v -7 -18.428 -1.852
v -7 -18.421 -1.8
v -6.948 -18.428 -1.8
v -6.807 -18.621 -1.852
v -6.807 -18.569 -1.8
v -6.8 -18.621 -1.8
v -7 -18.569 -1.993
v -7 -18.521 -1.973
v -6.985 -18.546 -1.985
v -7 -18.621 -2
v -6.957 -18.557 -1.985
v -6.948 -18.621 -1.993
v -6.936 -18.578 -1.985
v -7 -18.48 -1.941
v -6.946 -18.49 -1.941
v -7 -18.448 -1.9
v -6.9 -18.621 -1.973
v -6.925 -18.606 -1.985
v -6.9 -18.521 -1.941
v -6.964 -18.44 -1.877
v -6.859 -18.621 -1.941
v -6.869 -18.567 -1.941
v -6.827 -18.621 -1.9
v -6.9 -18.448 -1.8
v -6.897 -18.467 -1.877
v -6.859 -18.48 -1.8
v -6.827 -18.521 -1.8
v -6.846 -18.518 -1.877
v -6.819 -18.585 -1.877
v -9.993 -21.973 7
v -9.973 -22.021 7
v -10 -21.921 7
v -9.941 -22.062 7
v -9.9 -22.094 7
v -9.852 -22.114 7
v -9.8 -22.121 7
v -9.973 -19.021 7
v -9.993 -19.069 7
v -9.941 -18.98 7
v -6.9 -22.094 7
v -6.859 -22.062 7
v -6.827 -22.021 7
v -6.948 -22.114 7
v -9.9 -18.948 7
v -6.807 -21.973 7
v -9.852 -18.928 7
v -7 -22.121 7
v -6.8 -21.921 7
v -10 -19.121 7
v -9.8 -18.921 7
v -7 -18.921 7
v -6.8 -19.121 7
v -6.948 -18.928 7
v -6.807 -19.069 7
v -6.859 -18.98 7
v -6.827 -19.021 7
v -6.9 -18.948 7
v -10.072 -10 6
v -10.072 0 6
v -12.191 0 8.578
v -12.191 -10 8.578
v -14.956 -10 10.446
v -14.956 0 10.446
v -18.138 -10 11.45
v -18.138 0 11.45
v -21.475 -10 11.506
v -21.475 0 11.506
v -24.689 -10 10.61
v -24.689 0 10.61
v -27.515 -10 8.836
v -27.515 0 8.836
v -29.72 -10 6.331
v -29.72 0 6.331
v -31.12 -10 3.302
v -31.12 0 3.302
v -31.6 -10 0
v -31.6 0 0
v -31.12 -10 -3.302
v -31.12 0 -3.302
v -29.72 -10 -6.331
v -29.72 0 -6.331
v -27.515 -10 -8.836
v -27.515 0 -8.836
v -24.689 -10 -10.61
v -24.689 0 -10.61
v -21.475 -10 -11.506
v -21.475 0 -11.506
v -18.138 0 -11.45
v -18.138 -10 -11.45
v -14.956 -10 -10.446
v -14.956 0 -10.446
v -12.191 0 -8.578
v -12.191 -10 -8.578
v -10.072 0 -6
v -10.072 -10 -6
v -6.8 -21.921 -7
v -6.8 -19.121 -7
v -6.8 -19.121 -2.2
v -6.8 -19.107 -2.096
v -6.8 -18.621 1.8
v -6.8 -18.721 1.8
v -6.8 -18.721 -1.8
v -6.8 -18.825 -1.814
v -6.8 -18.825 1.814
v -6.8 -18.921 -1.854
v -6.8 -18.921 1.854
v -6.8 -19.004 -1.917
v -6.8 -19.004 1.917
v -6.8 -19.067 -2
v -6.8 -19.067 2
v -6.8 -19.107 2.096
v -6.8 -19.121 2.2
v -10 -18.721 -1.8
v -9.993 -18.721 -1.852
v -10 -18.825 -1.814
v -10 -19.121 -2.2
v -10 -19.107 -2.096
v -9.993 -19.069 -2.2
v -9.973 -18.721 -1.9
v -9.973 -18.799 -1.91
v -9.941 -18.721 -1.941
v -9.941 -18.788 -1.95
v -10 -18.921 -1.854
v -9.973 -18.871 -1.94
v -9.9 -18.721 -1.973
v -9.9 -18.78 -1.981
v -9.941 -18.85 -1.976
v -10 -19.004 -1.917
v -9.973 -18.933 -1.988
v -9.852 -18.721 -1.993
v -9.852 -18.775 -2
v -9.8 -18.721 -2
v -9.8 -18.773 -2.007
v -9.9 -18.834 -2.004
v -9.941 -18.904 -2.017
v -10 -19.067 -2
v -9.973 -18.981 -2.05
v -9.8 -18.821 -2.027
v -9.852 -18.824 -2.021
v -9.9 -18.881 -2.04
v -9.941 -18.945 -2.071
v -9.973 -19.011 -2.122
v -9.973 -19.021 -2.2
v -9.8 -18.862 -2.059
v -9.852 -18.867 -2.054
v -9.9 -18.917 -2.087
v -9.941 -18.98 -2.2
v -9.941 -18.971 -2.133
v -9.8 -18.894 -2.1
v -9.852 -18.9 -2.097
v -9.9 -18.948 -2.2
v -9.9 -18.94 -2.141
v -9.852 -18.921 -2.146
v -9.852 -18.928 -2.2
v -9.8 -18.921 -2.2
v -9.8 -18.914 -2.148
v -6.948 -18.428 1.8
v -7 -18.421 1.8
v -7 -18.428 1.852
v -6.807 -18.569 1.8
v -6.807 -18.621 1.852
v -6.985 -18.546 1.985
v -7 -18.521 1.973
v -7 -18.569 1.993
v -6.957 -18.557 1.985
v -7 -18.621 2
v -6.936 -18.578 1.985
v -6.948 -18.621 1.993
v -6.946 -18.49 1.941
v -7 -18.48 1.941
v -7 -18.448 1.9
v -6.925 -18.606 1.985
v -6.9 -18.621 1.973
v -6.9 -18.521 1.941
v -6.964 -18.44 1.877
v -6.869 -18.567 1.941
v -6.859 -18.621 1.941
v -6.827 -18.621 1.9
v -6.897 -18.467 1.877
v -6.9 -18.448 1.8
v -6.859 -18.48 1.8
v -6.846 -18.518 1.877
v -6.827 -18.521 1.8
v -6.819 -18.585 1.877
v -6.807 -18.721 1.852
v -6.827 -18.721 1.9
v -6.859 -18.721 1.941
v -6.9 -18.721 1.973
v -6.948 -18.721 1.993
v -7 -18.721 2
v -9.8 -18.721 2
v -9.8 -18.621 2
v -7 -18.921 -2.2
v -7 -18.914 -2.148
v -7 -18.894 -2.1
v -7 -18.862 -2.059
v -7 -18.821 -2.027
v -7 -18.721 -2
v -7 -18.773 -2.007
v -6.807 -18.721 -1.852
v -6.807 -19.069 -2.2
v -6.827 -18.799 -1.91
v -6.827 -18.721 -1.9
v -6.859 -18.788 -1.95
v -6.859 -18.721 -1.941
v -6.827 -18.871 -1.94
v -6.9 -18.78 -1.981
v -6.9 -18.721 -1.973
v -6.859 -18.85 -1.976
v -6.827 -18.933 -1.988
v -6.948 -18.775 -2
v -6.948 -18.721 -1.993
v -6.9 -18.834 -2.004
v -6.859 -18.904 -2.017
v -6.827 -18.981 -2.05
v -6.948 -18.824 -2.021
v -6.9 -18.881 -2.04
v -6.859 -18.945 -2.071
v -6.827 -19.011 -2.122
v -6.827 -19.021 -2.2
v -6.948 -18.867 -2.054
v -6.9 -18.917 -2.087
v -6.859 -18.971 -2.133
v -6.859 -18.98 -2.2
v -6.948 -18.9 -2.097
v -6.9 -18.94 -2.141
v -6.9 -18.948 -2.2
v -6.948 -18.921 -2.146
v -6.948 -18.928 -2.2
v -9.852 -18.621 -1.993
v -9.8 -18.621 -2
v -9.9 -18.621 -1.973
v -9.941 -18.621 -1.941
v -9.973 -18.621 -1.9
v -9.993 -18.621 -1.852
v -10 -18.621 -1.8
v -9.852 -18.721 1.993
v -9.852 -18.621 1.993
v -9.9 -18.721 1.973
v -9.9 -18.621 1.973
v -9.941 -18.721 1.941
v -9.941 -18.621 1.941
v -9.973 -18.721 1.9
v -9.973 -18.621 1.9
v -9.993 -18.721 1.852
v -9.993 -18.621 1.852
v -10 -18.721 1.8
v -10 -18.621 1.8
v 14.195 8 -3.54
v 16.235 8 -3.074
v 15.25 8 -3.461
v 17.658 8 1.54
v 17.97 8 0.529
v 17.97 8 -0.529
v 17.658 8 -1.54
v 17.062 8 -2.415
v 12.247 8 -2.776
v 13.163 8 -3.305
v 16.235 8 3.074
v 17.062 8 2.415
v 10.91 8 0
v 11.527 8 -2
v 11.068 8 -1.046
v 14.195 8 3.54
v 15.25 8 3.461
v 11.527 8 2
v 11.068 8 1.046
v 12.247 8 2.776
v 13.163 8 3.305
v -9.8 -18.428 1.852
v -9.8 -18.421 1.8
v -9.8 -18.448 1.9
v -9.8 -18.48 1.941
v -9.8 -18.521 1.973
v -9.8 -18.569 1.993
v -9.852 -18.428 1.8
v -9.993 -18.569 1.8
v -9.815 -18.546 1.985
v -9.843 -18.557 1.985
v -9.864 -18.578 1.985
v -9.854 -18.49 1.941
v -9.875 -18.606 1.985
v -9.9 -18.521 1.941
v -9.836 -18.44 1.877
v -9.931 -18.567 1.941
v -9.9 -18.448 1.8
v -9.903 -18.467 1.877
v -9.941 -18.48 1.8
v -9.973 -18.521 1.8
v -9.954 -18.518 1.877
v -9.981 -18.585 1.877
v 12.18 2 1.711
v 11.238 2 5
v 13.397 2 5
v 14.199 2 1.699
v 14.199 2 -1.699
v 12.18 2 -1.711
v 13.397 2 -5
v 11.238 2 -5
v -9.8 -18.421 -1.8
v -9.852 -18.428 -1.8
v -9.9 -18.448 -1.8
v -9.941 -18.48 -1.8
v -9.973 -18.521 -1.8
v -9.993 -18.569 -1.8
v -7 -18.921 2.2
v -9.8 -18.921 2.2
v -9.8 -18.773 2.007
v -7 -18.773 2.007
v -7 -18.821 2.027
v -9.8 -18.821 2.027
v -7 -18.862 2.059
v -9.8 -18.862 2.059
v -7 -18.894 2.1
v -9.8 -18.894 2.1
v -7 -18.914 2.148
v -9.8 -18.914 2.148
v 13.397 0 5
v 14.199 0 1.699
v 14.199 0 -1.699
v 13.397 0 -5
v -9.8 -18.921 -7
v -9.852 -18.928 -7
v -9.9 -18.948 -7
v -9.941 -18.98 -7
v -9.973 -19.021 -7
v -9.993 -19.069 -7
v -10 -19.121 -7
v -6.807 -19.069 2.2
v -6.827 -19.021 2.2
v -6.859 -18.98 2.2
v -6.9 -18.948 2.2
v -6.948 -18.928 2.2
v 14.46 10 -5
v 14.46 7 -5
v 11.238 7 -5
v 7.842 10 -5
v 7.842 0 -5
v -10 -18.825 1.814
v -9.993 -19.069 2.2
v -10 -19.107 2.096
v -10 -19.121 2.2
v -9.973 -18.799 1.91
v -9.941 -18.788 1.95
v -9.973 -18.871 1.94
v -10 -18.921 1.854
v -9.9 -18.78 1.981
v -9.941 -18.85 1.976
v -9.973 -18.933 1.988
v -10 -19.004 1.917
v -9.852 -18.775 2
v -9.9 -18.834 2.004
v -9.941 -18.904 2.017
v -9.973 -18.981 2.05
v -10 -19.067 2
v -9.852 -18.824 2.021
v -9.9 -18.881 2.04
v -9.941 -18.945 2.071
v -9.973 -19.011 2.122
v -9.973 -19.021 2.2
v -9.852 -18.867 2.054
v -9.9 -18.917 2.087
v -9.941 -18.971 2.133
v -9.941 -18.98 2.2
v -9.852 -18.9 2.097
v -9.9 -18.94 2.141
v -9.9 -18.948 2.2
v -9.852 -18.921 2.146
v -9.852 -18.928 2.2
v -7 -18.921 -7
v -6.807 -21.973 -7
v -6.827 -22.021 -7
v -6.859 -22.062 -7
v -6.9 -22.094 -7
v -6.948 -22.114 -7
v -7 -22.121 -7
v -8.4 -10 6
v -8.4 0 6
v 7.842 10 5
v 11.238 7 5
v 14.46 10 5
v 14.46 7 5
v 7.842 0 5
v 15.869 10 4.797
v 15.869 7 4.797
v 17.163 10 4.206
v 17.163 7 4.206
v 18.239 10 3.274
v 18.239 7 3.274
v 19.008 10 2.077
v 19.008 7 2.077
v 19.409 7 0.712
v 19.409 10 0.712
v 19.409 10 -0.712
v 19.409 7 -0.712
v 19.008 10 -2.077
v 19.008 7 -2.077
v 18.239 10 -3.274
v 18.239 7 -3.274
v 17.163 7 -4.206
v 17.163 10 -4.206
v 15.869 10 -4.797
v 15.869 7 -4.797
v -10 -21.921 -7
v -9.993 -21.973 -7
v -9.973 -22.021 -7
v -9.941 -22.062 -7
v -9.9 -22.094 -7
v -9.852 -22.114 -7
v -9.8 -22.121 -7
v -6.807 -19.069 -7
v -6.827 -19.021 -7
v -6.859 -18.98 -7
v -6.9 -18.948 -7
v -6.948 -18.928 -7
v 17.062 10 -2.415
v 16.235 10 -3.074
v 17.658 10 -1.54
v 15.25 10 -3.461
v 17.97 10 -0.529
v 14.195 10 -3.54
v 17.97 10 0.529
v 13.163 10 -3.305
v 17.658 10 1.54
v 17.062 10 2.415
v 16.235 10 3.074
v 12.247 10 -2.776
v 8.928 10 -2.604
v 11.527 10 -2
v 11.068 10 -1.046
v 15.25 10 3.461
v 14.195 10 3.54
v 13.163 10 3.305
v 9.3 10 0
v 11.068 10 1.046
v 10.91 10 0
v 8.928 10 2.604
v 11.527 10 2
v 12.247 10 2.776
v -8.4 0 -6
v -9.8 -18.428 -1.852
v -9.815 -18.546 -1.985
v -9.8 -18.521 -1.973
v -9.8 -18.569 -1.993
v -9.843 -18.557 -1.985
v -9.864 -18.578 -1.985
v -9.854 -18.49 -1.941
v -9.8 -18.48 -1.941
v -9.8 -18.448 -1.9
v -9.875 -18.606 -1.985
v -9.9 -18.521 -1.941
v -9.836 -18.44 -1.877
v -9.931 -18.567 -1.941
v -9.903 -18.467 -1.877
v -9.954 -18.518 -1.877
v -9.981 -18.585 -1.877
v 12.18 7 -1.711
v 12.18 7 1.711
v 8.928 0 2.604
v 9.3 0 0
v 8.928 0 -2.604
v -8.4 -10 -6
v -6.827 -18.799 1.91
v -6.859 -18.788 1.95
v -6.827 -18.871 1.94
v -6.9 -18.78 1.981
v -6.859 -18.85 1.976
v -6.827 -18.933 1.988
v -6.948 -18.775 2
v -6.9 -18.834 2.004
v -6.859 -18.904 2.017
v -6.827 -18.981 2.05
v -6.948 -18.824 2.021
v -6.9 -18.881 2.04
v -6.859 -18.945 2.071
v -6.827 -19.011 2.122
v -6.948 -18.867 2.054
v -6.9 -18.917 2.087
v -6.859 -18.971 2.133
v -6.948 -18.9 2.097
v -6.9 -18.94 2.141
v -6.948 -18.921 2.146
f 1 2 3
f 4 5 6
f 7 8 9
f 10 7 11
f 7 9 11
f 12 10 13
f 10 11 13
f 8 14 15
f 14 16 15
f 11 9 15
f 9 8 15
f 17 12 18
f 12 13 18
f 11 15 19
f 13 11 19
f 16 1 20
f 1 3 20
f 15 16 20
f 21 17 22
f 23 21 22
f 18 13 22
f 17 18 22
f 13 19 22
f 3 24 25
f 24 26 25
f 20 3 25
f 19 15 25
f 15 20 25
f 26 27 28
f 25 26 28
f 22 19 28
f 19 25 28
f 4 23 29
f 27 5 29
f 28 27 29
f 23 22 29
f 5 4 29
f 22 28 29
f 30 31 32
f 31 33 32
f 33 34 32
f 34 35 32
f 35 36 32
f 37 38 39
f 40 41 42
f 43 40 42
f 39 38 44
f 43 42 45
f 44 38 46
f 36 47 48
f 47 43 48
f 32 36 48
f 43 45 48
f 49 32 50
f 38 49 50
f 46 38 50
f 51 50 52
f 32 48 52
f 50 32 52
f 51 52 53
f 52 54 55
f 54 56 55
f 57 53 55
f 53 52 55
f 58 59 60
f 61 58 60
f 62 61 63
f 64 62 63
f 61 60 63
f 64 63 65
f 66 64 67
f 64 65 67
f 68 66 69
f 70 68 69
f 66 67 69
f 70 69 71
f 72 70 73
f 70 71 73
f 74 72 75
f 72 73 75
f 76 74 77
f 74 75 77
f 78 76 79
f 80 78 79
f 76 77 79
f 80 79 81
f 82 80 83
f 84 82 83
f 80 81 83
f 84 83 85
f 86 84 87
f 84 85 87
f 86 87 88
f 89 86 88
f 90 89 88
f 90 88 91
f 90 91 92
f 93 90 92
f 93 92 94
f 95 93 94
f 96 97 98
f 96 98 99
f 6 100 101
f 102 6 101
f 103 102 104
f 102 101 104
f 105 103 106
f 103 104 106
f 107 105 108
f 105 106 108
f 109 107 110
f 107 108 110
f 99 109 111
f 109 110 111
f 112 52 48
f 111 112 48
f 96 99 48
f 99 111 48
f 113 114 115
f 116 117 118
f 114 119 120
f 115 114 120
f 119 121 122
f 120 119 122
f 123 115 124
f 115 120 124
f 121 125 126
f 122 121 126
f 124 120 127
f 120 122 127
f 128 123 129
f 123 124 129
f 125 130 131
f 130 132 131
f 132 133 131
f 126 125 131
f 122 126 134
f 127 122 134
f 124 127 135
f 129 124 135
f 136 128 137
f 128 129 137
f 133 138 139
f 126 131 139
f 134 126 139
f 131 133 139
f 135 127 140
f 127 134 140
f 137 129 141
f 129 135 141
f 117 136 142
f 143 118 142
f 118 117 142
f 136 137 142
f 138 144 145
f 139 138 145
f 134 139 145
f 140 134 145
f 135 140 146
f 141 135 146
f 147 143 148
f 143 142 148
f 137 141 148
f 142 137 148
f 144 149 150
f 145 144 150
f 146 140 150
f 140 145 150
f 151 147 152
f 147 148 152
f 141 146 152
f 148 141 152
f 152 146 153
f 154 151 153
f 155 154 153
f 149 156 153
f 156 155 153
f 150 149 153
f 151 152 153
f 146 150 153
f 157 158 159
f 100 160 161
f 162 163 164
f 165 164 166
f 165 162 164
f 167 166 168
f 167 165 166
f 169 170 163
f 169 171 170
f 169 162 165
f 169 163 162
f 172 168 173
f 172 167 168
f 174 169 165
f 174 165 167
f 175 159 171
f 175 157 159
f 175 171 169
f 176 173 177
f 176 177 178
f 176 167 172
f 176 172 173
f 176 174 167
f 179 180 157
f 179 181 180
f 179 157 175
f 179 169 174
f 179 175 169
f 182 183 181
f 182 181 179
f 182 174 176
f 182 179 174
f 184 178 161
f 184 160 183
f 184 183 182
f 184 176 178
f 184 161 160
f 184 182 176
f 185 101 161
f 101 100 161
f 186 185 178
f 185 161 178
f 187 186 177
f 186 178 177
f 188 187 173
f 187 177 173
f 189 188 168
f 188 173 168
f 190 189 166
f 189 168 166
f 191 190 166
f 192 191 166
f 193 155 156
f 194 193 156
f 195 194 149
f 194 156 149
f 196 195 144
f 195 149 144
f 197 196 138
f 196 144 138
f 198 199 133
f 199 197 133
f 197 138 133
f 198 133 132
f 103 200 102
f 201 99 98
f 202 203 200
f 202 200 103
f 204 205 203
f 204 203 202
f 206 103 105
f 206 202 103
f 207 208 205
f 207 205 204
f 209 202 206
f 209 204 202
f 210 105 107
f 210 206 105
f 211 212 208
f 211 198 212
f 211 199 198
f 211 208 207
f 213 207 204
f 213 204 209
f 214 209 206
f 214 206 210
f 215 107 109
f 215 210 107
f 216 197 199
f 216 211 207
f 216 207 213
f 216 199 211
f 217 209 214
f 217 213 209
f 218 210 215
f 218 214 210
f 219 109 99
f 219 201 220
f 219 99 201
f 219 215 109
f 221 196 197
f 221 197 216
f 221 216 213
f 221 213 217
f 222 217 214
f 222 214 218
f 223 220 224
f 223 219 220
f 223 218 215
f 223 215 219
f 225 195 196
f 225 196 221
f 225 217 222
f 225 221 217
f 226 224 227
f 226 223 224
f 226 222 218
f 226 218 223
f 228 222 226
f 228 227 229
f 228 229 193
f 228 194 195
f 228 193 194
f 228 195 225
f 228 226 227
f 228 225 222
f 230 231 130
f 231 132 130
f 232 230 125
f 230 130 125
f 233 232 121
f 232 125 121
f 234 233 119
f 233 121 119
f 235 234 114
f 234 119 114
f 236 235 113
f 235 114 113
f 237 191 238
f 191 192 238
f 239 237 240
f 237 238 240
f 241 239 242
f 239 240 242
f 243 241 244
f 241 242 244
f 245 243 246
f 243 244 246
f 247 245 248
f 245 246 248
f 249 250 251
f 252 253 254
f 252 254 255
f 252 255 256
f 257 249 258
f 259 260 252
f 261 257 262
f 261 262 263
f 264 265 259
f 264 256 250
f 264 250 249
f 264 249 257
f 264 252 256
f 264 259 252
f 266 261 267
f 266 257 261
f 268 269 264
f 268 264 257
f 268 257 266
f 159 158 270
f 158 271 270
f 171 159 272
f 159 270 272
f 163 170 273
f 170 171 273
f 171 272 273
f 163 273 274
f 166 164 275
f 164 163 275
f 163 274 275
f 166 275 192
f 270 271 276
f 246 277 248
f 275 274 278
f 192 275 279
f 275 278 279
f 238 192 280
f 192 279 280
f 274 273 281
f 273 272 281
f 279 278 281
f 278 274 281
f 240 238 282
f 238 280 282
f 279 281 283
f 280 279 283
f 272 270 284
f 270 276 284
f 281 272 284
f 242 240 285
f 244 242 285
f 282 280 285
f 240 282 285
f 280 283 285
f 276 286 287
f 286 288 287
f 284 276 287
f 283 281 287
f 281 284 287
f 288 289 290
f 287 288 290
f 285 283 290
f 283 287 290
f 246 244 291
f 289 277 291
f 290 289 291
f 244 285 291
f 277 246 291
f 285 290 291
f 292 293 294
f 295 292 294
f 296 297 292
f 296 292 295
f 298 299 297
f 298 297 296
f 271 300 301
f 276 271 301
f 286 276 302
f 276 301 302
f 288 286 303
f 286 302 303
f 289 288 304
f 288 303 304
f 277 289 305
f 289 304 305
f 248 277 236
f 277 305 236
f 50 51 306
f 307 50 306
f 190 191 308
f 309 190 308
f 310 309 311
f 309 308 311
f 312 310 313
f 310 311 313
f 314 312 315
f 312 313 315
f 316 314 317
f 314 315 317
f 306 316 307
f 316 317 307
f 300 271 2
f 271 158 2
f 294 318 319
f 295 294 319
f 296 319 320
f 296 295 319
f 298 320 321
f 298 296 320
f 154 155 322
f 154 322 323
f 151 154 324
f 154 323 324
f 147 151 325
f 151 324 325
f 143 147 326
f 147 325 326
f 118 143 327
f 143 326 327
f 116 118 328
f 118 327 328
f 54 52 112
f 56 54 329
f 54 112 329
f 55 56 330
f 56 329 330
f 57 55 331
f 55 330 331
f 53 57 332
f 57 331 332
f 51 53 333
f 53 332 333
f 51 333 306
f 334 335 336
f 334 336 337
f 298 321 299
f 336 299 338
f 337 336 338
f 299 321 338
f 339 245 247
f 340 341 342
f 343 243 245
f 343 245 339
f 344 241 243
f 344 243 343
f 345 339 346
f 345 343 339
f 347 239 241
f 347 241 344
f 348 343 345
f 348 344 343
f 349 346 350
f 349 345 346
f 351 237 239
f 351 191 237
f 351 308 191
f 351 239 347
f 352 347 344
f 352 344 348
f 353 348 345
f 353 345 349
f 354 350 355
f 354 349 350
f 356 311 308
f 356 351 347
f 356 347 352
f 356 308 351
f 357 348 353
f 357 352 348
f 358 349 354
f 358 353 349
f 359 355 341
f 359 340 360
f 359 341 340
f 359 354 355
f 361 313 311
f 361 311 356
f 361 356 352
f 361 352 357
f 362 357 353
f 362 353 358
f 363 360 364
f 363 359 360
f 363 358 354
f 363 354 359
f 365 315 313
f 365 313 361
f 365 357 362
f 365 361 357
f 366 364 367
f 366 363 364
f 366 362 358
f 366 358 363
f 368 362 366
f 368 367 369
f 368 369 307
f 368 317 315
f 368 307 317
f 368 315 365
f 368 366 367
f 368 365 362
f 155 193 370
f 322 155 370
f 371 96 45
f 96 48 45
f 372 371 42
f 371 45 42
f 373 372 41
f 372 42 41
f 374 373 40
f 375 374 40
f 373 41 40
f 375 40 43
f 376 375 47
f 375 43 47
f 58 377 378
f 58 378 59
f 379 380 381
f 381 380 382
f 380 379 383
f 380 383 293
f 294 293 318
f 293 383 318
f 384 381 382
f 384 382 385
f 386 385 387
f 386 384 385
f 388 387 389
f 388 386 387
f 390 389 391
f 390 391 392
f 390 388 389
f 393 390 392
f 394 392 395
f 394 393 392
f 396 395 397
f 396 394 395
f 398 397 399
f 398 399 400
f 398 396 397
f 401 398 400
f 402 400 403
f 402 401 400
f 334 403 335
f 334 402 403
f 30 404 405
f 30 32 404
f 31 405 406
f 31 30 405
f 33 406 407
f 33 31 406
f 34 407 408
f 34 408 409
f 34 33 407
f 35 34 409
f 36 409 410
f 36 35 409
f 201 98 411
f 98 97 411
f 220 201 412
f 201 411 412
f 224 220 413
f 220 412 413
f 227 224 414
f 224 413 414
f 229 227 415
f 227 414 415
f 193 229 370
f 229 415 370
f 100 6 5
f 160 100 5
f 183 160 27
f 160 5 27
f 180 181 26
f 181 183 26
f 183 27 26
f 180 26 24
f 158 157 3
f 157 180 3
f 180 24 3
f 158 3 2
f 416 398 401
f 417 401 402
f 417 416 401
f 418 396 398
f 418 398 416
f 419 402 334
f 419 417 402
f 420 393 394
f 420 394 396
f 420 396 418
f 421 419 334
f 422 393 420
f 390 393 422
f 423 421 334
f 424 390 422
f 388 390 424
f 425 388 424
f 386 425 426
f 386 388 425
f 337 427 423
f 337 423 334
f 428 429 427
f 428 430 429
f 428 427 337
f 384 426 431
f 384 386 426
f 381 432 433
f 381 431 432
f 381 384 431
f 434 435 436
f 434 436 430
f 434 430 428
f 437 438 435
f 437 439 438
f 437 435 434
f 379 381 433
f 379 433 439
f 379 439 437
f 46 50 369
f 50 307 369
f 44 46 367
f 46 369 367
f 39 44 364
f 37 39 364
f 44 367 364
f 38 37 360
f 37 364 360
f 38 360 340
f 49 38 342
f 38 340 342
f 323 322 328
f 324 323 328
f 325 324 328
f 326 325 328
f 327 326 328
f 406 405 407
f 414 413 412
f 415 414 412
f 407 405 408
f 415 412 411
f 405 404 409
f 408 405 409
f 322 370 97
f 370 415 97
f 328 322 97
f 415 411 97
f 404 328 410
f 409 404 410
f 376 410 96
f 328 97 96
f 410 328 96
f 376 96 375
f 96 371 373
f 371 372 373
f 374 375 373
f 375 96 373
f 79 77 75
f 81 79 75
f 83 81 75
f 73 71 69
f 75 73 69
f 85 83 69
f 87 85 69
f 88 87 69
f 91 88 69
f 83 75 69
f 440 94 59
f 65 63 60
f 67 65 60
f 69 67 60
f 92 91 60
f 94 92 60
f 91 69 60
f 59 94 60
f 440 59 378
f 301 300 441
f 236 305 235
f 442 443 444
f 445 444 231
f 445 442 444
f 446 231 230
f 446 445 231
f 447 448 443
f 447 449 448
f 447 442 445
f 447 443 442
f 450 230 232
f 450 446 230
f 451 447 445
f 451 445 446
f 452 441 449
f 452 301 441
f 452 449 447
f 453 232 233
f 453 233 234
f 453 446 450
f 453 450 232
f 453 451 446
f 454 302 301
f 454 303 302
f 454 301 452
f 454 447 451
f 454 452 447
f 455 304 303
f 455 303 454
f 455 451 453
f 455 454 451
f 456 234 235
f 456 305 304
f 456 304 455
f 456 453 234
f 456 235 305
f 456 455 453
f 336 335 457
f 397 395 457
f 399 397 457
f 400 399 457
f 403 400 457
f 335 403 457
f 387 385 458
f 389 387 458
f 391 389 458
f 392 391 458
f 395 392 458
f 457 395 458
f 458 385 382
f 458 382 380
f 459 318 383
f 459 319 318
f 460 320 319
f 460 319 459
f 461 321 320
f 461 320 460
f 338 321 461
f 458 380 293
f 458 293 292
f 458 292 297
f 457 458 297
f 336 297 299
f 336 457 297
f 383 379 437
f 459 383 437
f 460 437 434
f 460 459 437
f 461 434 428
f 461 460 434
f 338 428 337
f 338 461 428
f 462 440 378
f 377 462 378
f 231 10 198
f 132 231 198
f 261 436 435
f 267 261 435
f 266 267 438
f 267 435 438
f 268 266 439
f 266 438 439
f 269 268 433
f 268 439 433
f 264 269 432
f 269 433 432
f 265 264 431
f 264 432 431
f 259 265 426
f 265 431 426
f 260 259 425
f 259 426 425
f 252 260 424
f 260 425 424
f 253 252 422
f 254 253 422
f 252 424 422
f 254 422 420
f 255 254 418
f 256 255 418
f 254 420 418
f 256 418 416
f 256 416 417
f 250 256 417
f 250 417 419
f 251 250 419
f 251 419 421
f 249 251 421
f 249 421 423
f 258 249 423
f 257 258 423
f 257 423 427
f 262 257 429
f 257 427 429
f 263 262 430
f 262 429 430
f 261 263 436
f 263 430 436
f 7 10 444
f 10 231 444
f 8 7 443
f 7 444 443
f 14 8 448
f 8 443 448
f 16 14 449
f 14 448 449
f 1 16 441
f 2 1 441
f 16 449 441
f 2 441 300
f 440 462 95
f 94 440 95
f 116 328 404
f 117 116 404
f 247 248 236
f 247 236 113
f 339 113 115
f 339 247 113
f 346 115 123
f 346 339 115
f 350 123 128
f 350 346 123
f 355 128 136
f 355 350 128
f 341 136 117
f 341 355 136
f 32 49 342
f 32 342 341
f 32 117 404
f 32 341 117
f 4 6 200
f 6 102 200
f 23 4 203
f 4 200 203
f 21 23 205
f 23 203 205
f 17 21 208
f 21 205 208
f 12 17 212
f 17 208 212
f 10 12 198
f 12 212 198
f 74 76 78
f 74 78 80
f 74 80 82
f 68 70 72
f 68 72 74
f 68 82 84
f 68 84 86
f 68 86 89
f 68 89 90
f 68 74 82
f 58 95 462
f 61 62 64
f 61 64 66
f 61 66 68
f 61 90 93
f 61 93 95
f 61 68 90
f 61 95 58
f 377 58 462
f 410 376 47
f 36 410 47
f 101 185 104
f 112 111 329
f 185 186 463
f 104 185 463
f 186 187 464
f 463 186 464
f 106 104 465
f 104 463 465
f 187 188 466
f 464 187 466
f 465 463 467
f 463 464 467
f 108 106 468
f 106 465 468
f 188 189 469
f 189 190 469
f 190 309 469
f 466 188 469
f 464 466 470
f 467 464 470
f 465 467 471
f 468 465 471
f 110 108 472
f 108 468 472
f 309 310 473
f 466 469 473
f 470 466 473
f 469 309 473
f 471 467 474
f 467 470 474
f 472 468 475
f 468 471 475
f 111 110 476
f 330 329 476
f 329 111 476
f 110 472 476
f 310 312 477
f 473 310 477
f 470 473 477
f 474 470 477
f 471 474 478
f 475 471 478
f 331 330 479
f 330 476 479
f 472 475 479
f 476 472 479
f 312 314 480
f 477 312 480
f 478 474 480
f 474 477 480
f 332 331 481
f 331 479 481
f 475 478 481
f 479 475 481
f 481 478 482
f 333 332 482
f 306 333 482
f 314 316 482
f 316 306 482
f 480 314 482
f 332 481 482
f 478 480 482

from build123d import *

# Parameters (mm, degrees)
SKETCH004_R      = 3.55
EXTRUDE002_DEPTH = 2
EXTRUDE_DEPTH    = 3
EXTRUDE001_DEPTH = 10
EXTRUDE003_DEPTH = 10
EXTRUDE004_DEPTH = 1.6
FILLET_R         = 0.2


with BuildPart() as extrude002:
    # Sketch004 (on Face11 of Fusion) → Extrude002 (new body)
    with BuildSketch(Plane(origin=(0, 10, 0), x_dir=(-1, 0, 0), z_dir=(0, 1, 0))):
        with Locations((-14.459973, 0)):
            Circle(SKETCH004_R)
    extrude(amount=-EXTRUDE002_DEPTH)


with BuildPart() as extrude_body:
    # Sketch003 (on Face5 of Cut) → Extrude (new body)
    with BuildSketch(Plane(origin=(0, 10, 0), x_dir=(-1, 0, 0), z_dir=(0, 1, 0))):
        with BuildLine():
            ThreePointArc((-14.459945, 5), (-19.459969, 0), (-14.459945, -5))
            Line((-14.459945, 5), (-14.459945, -5))
        make_face()
    extrude(amount=-EXTRUDE_DEPTH)


with BuildPart() as extrude001:
    # Sketch002 → Extrude001 (new body)
    with BuildSketch(Plane.XZ):
        Polygon((1, 5), (20, 5), (20, 20), (-20, 20), (-20, -20), (20, -20), (20, -5), (1, -5), (1, 0), align=None)
    extrude(amount=-EXTRUDE001_DEPTH)


with BuildPart() as cut001:
    # Sketch → Revolve (revolve)
    with BuildSketch(Plane.XY):
        Polygon((9.3, 10), (9.3, 0), (14.3, 0), (14.3, 2), (12.3, 2), (12.3, 7), (15.3, 7), (15.3, 10), align=None)
    revolve(axis=Axis((0, 0, 0), (0, 1, 0)))

    # Cut: cut Extrude001
    add(extrude001.part, mode=Mode.SUBTRACT)

    # Fusion: union Extrude body
    add(extrude_body.part)

    # Cut001: cut Extrude002
    add(extrude002.part, mode=Mode.SUBTRACT)


with BuildPart() as extrude003:
    # Sketch005 → Extrude003 (new body)
    with BuildSketch(Plane.XZ):
        with BuildLine():
            ThreePointArc((-10.072261, 6), (-31.6, 0), (-10.072261, -6))
            Line((-8.4, -6), (-10.072261, -6))
            Line((-8.4, 0), (-8.4, -6))
            Line((-8.4, 0), (-8.4, 6))
            Line((-8.4, 6), (-10.072261, 6))
        make_face()
    extrude(amount=EXTRUDE003_DEPTH)


with BuildPart() as body:
    # Sketch006 (on Face1 of Extrude003) → Extrude004 (new body, symmetric)
    with BuildSketch(Plane.YZ.offset(-8.4)):
        Polygon((-22.121005, 7), (-18.921005, 7), (-18.921005, 2), (-18.421005, 2), (-18.421005, -2), (-18.921005, -2), (-18.921005, -7), (-22.121005, -7), align=None)
    extrude(amount=EXTRUDE004_DEPTH, both=True)

    # Fillet
    fillet_edges = [body.edges().sort_by_distance(p)[0] for p in [
        (-10, -22.121005, 0),
        (-10, -18.921005, -4.5),
        (-6.8, -18.921005, -4.5),
        (-10, -18.921005, 4.5),
        (-6.8, -18.921005, 4.5),
        (-6.8, -22.121005, 0),
        (-10, -18.421005, 0),
        (-6.8, -18.421005, 0),
        (-8.4, -18.921005, -2),
        (-8.4, -18.421005, -2),
        (-10, -18.671005, -2),
        (-6.8, -18.671005, -2),
        (-8.4, -18.421005, 2),
        (-8.4, -18.921005, 2),
        (-10, -18.671005, 2),
        (-6.8, -18.671005, 2),
    ]]
    fillet(fillet_edges, radius=FILLET_R)


solid = Compound([cut001.part, extrude003.part, body.part])
